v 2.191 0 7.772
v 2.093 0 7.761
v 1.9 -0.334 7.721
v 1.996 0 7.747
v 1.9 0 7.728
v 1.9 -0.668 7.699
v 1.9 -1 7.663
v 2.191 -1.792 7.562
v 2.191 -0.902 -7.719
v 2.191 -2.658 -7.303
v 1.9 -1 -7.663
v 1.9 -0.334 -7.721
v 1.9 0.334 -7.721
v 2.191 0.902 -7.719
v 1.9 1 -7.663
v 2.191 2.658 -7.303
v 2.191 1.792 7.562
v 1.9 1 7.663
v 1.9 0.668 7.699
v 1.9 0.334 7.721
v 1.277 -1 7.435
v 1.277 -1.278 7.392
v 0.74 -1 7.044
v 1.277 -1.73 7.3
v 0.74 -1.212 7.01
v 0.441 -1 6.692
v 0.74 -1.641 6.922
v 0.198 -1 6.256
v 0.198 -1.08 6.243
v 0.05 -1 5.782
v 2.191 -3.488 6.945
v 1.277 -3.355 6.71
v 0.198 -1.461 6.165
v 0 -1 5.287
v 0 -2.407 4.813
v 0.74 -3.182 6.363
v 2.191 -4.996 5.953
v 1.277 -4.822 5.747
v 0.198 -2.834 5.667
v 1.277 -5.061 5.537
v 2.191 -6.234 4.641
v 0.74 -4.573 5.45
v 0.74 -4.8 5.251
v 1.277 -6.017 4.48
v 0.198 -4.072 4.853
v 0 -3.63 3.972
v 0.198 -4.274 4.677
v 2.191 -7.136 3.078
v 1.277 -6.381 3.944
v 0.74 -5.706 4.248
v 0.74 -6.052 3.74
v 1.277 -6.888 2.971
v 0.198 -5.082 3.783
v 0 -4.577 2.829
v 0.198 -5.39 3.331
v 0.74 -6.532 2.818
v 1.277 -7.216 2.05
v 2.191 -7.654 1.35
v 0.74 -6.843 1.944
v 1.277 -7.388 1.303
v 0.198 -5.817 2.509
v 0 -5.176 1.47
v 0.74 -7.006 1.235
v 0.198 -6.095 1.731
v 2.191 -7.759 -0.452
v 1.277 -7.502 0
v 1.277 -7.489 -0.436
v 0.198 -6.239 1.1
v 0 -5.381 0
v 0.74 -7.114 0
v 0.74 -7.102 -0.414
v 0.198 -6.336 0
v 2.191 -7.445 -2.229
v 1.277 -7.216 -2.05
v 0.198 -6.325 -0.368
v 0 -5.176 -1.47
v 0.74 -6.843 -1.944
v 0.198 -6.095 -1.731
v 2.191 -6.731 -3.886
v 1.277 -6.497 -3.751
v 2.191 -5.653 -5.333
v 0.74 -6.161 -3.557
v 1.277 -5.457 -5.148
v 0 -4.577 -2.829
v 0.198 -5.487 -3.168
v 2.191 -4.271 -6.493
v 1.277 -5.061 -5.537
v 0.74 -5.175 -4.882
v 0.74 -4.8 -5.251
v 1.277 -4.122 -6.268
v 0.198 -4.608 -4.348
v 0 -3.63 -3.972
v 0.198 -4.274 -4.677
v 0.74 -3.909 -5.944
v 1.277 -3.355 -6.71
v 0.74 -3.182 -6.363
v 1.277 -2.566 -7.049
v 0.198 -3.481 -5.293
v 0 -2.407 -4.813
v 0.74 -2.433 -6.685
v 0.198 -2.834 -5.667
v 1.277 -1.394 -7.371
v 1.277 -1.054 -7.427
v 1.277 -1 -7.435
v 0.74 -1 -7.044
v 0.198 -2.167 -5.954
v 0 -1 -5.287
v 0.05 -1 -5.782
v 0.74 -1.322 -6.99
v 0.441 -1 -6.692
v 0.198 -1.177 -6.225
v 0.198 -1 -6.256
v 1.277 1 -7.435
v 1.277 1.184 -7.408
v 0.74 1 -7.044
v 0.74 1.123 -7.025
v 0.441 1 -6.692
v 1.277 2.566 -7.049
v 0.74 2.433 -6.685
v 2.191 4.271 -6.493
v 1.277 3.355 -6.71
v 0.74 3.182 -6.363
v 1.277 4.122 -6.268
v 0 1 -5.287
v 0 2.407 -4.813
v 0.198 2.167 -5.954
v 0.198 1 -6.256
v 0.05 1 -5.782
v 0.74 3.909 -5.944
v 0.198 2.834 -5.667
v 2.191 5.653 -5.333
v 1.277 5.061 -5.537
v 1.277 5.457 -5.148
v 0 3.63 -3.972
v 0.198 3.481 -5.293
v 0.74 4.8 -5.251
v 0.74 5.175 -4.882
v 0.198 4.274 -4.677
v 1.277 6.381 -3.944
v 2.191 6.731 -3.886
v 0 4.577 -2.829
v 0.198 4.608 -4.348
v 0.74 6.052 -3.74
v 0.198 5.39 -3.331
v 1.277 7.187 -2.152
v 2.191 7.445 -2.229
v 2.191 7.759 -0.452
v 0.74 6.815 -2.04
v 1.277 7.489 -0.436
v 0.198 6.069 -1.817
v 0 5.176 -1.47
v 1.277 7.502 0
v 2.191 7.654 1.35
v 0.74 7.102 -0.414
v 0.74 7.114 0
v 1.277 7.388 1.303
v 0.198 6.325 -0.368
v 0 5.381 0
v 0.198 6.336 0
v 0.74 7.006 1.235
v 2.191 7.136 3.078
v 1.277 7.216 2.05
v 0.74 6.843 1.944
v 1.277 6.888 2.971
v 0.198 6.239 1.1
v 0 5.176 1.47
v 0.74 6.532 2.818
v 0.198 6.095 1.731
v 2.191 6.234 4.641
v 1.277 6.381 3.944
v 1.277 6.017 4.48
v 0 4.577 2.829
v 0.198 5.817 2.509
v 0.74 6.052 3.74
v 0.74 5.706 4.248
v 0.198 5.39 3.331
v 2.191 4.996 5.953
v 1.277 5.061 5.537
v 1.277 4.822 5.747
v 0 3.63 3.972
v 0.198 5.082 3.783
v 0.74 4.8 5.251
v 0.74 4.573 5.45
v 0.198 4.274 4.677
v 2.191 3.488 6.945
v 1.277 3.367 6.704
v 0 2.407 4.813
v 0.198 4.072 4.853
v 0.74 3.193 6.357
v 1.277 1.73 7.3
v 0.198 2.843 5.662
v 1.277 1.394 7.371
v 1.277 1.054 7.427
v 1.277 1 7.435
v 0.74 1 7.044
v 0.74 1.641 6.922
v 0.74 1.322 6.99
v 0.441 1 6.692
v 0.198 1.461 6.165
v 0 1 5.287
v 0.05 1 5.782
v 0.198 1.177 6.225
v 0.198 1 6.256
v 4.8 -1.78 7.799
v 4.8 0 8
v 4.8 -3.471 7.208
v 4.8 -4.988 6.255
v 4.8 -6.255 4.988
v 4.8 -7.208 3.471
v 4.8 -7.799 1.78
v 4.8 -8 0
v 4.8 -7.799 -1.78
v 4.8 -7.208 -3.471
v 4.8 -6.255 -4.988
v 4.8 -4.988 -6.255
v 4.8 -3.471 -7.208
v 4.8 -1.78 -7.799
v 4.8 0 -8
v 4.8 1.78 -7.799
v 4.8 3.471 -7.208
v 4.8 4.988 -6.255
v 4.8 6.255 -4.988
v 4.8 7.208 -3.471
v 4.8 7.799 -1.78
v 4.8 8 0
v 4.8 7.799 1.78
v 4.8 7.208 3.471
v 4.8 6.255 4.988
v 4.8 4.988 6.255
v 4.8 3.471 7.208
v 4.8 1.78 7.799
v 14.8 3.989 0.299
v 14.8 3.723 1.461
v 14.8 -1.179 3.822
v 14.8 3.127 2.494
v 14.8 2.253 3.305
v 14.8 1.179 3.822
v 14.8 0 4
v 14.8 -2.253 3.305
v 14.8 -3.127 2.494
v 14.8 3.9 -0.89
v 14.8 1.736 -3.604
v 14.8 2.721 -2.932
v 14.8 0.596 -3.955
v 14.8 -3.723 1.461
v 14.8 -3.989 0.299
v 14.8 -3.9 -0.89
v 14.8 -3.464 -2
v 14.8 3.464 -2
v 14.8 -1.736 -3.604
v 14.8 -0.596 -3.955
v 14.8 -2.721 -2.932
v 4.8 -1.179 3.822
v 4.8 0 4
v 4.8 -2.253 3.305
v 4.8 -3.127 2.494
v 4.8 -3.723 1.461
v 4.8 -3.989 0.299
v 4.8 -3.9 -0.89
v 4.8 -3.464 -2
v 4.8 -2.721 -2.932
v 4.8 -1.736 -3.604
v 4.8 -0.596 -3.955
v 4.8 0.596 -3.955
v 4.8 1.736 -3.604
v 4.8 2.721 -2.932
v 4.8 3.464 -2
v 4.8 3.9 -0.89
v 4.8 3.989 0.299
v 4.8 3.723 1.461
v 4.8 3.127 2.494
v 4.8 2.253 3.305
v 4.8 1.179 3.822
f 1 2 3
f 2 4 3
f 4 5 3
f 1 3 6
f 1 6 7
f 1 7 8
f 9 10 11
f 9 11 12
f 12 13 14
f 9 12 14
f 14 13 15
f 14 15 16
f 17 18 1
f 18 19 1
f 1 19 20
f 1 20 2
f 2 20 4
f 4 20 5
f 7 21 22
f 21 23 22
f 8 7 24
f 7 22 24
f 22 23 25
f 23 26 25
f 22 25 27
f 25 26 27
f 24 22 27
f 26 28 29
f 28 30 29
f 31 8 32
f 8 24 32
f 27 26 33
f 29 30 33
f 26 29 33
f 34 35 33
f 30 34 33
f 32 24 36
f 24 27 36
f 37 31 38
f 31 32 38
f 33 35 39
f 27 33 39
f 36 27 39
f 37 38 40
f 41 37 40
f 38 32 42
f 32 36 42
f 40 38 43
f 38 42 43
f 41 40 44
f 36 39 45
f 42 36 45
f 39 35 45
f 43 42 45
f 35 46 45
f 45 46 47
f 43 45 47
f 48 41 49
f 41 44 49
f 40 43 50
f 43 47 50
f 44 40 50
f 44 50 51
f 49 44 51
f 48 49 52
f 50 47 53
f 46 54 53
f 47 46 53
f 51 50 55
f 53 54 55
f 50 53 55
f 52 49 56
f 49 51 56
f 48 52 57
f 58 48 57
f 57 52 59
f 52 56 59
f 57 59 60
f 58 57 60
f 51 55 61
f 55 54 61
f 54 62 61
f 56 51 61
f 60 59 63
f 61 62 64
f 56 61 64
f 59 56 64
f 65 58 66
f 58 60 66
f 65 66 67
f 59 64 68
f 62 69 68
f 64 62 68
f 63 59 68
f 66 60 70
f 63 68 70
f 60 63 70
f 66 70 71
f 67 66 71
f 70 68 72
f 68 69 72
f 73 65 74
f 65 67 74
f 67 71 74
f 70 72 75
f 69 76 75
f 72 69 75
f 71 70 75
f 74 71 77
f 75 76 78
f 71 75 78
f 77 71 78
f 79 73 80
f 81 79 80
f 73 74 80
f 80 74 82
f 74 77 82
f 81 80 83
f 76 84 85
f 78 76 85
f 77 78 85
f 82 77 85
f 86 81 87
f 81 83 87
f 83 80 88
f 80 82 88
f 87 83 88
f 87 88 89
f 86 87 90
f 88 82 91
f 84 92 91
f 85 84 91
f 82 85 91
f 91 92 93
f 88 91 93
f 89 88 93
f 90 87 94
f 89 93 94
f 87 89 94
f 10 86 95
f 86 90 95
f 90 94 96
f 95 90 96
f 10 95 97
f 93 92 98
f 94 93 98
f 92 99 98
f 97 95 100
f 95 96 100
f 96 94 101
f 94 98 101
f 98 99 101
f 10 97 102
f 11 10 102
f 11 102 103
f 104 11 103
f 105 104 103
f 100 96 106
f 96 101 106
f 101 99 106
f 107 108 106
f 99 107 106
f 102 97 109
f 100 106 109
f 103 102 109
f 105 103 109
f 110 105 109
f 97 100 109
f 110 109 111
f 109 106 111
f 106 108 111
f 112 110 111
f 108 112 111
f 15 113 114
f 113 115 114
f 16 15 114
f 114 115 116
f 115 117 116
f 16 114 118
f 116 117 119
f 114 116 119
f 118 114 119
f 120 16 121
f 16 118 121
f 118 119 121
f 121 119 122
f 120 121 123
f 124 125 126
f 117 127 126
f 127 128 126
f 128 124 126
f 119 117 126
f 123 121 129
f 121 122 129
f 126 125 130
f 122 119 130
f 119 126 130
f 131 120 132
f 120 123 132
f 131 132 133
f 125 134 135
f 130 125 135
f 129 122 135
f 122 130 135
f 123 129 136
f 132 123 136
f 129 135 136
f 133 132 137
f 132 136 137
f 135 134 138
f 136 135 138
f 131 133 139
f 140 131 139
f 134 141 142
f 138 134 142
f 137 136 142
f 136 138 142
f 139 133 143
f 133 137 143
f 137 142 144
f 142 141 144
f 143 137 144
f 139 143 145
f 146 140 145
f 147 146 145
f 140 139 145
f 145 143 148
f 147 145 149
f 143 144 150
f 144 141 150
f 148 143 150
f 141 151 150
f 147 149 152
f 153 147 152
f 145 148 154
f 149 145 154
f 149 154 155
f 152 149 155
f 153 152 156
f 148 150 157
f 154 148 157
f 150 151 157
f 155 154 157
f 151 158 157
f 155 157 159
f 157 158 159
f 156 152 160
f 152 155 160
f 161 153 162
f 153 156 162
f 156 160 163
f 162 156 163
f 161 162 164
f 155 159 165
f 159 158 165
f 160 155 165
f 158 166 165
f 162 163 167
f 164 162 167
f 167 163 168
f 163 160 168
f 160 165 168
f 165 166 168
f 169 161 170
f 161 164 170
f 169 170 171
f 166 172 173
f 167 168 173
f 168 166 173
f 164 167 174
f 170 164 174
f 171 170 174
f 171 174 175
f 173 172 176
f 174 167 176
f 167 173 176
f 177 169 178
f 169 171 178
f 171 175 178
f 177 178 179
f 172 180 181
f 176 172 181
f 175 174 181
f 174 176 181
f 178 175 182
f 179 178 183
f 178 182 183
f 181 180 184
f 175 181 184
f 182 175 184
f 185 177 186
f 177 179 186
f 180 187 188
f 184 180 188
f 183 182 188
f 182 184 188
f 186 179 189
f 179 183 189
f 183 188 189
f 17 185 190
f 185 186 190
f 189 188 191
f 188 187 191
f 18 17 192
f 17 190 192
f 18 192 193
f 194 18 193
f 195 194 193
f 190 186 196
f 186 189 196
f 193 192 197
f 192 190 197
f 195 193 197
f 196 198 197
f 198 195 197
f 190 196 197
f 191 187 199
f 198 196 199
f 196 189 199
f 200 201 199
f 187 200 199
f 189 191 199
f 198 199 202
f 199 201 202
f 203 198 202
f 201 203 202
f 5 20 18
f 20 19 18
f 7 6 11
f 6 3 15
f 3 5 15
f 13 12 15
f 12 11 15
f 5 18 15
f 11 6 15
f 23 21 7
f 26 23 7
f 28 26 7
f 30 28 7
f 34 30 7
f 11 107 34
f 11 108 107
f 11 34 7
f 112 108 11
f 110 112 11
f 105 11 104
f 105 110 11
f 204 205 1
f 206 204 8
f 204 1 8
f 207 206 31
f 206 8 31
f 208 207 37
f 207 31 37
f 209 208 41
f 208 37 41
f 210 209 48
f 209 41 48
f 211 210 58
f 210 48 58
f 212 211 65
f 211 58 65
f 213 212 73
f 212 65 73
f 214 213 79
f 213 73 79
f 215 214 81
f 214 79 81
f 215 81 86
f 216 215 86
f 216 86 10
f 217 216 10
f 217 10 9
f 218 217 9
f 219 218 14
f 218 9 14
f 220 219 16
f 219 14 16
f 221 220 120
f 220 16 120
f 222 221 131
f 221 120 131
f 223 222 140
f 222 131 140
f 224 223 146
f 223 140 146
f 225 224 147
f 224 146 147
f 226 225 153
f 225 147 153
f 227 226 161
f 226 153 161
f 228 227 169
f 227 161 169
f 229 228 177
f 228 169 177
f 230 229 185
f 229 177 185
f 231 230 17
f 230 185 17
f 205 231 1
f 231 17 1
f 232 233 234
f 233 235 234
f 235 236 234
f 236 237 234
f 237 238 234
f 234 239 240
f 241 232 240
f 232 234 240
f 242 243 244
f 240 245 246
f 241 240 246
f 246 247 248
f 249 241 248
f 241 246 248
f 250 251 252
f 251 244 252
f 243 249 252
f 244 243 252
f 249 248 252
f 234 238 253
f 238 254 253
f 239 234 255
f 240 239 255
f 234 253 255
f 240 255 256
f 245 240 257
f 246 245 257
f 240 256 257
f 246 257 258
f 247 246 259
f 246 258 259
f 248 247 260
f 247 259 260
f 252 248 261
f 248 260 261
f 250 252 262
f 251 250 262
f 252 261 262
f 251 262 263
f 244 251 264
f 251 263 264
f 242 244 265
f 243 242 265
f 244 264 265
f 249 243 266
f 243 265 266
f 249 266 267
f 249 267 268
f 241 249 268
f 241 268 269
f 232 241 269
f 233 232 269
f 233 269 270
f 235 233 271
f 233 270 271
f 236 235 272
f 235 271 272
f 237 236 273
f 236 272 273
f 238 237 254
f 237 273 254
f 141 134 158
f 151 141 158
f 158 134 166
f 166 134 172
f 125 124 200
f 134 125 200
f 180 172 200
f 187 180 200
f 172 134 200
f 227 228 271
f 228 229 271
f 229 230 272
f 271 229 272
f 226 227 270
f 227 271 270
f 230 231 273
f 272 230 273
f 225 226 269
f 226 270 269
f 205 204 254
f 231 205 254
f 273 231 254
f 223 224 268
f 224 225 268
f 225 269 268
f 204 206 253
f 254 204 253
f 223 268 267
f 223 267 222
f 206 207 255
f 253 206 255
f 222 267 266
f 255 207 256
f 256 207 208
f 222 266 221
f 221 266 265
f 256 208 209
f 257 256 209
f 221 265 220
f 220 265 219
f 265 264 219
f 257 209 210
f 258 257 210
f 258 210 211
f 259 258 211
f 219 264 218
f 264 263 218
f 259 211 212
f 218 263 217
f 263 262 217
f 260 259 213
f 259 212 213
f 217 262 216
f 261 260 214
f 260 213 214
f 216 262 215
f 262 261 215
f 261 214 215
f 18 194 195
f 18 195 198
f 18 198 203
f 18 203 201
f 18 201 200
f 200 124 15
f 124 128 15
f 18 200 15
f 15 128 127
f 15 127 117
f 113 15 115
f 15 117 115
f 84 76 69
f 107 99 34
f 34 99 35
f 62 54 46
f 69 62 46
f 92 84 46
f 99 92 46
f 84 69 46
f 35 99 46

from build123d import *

# Parameters (mm, degrees)
FILLET2_R  = 2.4
SKETCH2_W  = 16
SKETCH2_H  = 2
SLOT_DEPTH = 1.9


with BuildPart() as part:
    # BodySke → Base-Revolve (revolve)
    with BuildSketch(Plane.XY, mode=Mode.PRIVATE) as base_revolve_sk:
        Polygon((4.8, 4), (4.8, 8), (0, 7.580054415), (0, 0), (14.8, 0), (14.8, 4), align=None)
    revolve(base_revolve_sk.sketch.rotate(Axis((-25.4, 0, 0), (1, 0, 0)), 90), axis=Axis((-25.4, 0, 0), (1, 0, 0)))  # turned: the seam where the file's is

    # Fillet2
    fillet2_edges = [part.edges().sort_by_distance(p)[0] for p in [
        (0, 0, -7.580054415),
    ]]
    fillet(fillet2_edges, radius=FILLET2_R)

    # Sketch2 → Slot (cut)
    with BuildSketch(Plane(origin=(0, 0, 0), x_dir=(0, 0, -1), z_dir=(1, 0, 0))):
        Rectangle(SKETCH2_W, SKETCH2_H)
    extrude(amount=SLOT_DEPTH, mode=Mode.SUBTRACT)


solid = part.part
